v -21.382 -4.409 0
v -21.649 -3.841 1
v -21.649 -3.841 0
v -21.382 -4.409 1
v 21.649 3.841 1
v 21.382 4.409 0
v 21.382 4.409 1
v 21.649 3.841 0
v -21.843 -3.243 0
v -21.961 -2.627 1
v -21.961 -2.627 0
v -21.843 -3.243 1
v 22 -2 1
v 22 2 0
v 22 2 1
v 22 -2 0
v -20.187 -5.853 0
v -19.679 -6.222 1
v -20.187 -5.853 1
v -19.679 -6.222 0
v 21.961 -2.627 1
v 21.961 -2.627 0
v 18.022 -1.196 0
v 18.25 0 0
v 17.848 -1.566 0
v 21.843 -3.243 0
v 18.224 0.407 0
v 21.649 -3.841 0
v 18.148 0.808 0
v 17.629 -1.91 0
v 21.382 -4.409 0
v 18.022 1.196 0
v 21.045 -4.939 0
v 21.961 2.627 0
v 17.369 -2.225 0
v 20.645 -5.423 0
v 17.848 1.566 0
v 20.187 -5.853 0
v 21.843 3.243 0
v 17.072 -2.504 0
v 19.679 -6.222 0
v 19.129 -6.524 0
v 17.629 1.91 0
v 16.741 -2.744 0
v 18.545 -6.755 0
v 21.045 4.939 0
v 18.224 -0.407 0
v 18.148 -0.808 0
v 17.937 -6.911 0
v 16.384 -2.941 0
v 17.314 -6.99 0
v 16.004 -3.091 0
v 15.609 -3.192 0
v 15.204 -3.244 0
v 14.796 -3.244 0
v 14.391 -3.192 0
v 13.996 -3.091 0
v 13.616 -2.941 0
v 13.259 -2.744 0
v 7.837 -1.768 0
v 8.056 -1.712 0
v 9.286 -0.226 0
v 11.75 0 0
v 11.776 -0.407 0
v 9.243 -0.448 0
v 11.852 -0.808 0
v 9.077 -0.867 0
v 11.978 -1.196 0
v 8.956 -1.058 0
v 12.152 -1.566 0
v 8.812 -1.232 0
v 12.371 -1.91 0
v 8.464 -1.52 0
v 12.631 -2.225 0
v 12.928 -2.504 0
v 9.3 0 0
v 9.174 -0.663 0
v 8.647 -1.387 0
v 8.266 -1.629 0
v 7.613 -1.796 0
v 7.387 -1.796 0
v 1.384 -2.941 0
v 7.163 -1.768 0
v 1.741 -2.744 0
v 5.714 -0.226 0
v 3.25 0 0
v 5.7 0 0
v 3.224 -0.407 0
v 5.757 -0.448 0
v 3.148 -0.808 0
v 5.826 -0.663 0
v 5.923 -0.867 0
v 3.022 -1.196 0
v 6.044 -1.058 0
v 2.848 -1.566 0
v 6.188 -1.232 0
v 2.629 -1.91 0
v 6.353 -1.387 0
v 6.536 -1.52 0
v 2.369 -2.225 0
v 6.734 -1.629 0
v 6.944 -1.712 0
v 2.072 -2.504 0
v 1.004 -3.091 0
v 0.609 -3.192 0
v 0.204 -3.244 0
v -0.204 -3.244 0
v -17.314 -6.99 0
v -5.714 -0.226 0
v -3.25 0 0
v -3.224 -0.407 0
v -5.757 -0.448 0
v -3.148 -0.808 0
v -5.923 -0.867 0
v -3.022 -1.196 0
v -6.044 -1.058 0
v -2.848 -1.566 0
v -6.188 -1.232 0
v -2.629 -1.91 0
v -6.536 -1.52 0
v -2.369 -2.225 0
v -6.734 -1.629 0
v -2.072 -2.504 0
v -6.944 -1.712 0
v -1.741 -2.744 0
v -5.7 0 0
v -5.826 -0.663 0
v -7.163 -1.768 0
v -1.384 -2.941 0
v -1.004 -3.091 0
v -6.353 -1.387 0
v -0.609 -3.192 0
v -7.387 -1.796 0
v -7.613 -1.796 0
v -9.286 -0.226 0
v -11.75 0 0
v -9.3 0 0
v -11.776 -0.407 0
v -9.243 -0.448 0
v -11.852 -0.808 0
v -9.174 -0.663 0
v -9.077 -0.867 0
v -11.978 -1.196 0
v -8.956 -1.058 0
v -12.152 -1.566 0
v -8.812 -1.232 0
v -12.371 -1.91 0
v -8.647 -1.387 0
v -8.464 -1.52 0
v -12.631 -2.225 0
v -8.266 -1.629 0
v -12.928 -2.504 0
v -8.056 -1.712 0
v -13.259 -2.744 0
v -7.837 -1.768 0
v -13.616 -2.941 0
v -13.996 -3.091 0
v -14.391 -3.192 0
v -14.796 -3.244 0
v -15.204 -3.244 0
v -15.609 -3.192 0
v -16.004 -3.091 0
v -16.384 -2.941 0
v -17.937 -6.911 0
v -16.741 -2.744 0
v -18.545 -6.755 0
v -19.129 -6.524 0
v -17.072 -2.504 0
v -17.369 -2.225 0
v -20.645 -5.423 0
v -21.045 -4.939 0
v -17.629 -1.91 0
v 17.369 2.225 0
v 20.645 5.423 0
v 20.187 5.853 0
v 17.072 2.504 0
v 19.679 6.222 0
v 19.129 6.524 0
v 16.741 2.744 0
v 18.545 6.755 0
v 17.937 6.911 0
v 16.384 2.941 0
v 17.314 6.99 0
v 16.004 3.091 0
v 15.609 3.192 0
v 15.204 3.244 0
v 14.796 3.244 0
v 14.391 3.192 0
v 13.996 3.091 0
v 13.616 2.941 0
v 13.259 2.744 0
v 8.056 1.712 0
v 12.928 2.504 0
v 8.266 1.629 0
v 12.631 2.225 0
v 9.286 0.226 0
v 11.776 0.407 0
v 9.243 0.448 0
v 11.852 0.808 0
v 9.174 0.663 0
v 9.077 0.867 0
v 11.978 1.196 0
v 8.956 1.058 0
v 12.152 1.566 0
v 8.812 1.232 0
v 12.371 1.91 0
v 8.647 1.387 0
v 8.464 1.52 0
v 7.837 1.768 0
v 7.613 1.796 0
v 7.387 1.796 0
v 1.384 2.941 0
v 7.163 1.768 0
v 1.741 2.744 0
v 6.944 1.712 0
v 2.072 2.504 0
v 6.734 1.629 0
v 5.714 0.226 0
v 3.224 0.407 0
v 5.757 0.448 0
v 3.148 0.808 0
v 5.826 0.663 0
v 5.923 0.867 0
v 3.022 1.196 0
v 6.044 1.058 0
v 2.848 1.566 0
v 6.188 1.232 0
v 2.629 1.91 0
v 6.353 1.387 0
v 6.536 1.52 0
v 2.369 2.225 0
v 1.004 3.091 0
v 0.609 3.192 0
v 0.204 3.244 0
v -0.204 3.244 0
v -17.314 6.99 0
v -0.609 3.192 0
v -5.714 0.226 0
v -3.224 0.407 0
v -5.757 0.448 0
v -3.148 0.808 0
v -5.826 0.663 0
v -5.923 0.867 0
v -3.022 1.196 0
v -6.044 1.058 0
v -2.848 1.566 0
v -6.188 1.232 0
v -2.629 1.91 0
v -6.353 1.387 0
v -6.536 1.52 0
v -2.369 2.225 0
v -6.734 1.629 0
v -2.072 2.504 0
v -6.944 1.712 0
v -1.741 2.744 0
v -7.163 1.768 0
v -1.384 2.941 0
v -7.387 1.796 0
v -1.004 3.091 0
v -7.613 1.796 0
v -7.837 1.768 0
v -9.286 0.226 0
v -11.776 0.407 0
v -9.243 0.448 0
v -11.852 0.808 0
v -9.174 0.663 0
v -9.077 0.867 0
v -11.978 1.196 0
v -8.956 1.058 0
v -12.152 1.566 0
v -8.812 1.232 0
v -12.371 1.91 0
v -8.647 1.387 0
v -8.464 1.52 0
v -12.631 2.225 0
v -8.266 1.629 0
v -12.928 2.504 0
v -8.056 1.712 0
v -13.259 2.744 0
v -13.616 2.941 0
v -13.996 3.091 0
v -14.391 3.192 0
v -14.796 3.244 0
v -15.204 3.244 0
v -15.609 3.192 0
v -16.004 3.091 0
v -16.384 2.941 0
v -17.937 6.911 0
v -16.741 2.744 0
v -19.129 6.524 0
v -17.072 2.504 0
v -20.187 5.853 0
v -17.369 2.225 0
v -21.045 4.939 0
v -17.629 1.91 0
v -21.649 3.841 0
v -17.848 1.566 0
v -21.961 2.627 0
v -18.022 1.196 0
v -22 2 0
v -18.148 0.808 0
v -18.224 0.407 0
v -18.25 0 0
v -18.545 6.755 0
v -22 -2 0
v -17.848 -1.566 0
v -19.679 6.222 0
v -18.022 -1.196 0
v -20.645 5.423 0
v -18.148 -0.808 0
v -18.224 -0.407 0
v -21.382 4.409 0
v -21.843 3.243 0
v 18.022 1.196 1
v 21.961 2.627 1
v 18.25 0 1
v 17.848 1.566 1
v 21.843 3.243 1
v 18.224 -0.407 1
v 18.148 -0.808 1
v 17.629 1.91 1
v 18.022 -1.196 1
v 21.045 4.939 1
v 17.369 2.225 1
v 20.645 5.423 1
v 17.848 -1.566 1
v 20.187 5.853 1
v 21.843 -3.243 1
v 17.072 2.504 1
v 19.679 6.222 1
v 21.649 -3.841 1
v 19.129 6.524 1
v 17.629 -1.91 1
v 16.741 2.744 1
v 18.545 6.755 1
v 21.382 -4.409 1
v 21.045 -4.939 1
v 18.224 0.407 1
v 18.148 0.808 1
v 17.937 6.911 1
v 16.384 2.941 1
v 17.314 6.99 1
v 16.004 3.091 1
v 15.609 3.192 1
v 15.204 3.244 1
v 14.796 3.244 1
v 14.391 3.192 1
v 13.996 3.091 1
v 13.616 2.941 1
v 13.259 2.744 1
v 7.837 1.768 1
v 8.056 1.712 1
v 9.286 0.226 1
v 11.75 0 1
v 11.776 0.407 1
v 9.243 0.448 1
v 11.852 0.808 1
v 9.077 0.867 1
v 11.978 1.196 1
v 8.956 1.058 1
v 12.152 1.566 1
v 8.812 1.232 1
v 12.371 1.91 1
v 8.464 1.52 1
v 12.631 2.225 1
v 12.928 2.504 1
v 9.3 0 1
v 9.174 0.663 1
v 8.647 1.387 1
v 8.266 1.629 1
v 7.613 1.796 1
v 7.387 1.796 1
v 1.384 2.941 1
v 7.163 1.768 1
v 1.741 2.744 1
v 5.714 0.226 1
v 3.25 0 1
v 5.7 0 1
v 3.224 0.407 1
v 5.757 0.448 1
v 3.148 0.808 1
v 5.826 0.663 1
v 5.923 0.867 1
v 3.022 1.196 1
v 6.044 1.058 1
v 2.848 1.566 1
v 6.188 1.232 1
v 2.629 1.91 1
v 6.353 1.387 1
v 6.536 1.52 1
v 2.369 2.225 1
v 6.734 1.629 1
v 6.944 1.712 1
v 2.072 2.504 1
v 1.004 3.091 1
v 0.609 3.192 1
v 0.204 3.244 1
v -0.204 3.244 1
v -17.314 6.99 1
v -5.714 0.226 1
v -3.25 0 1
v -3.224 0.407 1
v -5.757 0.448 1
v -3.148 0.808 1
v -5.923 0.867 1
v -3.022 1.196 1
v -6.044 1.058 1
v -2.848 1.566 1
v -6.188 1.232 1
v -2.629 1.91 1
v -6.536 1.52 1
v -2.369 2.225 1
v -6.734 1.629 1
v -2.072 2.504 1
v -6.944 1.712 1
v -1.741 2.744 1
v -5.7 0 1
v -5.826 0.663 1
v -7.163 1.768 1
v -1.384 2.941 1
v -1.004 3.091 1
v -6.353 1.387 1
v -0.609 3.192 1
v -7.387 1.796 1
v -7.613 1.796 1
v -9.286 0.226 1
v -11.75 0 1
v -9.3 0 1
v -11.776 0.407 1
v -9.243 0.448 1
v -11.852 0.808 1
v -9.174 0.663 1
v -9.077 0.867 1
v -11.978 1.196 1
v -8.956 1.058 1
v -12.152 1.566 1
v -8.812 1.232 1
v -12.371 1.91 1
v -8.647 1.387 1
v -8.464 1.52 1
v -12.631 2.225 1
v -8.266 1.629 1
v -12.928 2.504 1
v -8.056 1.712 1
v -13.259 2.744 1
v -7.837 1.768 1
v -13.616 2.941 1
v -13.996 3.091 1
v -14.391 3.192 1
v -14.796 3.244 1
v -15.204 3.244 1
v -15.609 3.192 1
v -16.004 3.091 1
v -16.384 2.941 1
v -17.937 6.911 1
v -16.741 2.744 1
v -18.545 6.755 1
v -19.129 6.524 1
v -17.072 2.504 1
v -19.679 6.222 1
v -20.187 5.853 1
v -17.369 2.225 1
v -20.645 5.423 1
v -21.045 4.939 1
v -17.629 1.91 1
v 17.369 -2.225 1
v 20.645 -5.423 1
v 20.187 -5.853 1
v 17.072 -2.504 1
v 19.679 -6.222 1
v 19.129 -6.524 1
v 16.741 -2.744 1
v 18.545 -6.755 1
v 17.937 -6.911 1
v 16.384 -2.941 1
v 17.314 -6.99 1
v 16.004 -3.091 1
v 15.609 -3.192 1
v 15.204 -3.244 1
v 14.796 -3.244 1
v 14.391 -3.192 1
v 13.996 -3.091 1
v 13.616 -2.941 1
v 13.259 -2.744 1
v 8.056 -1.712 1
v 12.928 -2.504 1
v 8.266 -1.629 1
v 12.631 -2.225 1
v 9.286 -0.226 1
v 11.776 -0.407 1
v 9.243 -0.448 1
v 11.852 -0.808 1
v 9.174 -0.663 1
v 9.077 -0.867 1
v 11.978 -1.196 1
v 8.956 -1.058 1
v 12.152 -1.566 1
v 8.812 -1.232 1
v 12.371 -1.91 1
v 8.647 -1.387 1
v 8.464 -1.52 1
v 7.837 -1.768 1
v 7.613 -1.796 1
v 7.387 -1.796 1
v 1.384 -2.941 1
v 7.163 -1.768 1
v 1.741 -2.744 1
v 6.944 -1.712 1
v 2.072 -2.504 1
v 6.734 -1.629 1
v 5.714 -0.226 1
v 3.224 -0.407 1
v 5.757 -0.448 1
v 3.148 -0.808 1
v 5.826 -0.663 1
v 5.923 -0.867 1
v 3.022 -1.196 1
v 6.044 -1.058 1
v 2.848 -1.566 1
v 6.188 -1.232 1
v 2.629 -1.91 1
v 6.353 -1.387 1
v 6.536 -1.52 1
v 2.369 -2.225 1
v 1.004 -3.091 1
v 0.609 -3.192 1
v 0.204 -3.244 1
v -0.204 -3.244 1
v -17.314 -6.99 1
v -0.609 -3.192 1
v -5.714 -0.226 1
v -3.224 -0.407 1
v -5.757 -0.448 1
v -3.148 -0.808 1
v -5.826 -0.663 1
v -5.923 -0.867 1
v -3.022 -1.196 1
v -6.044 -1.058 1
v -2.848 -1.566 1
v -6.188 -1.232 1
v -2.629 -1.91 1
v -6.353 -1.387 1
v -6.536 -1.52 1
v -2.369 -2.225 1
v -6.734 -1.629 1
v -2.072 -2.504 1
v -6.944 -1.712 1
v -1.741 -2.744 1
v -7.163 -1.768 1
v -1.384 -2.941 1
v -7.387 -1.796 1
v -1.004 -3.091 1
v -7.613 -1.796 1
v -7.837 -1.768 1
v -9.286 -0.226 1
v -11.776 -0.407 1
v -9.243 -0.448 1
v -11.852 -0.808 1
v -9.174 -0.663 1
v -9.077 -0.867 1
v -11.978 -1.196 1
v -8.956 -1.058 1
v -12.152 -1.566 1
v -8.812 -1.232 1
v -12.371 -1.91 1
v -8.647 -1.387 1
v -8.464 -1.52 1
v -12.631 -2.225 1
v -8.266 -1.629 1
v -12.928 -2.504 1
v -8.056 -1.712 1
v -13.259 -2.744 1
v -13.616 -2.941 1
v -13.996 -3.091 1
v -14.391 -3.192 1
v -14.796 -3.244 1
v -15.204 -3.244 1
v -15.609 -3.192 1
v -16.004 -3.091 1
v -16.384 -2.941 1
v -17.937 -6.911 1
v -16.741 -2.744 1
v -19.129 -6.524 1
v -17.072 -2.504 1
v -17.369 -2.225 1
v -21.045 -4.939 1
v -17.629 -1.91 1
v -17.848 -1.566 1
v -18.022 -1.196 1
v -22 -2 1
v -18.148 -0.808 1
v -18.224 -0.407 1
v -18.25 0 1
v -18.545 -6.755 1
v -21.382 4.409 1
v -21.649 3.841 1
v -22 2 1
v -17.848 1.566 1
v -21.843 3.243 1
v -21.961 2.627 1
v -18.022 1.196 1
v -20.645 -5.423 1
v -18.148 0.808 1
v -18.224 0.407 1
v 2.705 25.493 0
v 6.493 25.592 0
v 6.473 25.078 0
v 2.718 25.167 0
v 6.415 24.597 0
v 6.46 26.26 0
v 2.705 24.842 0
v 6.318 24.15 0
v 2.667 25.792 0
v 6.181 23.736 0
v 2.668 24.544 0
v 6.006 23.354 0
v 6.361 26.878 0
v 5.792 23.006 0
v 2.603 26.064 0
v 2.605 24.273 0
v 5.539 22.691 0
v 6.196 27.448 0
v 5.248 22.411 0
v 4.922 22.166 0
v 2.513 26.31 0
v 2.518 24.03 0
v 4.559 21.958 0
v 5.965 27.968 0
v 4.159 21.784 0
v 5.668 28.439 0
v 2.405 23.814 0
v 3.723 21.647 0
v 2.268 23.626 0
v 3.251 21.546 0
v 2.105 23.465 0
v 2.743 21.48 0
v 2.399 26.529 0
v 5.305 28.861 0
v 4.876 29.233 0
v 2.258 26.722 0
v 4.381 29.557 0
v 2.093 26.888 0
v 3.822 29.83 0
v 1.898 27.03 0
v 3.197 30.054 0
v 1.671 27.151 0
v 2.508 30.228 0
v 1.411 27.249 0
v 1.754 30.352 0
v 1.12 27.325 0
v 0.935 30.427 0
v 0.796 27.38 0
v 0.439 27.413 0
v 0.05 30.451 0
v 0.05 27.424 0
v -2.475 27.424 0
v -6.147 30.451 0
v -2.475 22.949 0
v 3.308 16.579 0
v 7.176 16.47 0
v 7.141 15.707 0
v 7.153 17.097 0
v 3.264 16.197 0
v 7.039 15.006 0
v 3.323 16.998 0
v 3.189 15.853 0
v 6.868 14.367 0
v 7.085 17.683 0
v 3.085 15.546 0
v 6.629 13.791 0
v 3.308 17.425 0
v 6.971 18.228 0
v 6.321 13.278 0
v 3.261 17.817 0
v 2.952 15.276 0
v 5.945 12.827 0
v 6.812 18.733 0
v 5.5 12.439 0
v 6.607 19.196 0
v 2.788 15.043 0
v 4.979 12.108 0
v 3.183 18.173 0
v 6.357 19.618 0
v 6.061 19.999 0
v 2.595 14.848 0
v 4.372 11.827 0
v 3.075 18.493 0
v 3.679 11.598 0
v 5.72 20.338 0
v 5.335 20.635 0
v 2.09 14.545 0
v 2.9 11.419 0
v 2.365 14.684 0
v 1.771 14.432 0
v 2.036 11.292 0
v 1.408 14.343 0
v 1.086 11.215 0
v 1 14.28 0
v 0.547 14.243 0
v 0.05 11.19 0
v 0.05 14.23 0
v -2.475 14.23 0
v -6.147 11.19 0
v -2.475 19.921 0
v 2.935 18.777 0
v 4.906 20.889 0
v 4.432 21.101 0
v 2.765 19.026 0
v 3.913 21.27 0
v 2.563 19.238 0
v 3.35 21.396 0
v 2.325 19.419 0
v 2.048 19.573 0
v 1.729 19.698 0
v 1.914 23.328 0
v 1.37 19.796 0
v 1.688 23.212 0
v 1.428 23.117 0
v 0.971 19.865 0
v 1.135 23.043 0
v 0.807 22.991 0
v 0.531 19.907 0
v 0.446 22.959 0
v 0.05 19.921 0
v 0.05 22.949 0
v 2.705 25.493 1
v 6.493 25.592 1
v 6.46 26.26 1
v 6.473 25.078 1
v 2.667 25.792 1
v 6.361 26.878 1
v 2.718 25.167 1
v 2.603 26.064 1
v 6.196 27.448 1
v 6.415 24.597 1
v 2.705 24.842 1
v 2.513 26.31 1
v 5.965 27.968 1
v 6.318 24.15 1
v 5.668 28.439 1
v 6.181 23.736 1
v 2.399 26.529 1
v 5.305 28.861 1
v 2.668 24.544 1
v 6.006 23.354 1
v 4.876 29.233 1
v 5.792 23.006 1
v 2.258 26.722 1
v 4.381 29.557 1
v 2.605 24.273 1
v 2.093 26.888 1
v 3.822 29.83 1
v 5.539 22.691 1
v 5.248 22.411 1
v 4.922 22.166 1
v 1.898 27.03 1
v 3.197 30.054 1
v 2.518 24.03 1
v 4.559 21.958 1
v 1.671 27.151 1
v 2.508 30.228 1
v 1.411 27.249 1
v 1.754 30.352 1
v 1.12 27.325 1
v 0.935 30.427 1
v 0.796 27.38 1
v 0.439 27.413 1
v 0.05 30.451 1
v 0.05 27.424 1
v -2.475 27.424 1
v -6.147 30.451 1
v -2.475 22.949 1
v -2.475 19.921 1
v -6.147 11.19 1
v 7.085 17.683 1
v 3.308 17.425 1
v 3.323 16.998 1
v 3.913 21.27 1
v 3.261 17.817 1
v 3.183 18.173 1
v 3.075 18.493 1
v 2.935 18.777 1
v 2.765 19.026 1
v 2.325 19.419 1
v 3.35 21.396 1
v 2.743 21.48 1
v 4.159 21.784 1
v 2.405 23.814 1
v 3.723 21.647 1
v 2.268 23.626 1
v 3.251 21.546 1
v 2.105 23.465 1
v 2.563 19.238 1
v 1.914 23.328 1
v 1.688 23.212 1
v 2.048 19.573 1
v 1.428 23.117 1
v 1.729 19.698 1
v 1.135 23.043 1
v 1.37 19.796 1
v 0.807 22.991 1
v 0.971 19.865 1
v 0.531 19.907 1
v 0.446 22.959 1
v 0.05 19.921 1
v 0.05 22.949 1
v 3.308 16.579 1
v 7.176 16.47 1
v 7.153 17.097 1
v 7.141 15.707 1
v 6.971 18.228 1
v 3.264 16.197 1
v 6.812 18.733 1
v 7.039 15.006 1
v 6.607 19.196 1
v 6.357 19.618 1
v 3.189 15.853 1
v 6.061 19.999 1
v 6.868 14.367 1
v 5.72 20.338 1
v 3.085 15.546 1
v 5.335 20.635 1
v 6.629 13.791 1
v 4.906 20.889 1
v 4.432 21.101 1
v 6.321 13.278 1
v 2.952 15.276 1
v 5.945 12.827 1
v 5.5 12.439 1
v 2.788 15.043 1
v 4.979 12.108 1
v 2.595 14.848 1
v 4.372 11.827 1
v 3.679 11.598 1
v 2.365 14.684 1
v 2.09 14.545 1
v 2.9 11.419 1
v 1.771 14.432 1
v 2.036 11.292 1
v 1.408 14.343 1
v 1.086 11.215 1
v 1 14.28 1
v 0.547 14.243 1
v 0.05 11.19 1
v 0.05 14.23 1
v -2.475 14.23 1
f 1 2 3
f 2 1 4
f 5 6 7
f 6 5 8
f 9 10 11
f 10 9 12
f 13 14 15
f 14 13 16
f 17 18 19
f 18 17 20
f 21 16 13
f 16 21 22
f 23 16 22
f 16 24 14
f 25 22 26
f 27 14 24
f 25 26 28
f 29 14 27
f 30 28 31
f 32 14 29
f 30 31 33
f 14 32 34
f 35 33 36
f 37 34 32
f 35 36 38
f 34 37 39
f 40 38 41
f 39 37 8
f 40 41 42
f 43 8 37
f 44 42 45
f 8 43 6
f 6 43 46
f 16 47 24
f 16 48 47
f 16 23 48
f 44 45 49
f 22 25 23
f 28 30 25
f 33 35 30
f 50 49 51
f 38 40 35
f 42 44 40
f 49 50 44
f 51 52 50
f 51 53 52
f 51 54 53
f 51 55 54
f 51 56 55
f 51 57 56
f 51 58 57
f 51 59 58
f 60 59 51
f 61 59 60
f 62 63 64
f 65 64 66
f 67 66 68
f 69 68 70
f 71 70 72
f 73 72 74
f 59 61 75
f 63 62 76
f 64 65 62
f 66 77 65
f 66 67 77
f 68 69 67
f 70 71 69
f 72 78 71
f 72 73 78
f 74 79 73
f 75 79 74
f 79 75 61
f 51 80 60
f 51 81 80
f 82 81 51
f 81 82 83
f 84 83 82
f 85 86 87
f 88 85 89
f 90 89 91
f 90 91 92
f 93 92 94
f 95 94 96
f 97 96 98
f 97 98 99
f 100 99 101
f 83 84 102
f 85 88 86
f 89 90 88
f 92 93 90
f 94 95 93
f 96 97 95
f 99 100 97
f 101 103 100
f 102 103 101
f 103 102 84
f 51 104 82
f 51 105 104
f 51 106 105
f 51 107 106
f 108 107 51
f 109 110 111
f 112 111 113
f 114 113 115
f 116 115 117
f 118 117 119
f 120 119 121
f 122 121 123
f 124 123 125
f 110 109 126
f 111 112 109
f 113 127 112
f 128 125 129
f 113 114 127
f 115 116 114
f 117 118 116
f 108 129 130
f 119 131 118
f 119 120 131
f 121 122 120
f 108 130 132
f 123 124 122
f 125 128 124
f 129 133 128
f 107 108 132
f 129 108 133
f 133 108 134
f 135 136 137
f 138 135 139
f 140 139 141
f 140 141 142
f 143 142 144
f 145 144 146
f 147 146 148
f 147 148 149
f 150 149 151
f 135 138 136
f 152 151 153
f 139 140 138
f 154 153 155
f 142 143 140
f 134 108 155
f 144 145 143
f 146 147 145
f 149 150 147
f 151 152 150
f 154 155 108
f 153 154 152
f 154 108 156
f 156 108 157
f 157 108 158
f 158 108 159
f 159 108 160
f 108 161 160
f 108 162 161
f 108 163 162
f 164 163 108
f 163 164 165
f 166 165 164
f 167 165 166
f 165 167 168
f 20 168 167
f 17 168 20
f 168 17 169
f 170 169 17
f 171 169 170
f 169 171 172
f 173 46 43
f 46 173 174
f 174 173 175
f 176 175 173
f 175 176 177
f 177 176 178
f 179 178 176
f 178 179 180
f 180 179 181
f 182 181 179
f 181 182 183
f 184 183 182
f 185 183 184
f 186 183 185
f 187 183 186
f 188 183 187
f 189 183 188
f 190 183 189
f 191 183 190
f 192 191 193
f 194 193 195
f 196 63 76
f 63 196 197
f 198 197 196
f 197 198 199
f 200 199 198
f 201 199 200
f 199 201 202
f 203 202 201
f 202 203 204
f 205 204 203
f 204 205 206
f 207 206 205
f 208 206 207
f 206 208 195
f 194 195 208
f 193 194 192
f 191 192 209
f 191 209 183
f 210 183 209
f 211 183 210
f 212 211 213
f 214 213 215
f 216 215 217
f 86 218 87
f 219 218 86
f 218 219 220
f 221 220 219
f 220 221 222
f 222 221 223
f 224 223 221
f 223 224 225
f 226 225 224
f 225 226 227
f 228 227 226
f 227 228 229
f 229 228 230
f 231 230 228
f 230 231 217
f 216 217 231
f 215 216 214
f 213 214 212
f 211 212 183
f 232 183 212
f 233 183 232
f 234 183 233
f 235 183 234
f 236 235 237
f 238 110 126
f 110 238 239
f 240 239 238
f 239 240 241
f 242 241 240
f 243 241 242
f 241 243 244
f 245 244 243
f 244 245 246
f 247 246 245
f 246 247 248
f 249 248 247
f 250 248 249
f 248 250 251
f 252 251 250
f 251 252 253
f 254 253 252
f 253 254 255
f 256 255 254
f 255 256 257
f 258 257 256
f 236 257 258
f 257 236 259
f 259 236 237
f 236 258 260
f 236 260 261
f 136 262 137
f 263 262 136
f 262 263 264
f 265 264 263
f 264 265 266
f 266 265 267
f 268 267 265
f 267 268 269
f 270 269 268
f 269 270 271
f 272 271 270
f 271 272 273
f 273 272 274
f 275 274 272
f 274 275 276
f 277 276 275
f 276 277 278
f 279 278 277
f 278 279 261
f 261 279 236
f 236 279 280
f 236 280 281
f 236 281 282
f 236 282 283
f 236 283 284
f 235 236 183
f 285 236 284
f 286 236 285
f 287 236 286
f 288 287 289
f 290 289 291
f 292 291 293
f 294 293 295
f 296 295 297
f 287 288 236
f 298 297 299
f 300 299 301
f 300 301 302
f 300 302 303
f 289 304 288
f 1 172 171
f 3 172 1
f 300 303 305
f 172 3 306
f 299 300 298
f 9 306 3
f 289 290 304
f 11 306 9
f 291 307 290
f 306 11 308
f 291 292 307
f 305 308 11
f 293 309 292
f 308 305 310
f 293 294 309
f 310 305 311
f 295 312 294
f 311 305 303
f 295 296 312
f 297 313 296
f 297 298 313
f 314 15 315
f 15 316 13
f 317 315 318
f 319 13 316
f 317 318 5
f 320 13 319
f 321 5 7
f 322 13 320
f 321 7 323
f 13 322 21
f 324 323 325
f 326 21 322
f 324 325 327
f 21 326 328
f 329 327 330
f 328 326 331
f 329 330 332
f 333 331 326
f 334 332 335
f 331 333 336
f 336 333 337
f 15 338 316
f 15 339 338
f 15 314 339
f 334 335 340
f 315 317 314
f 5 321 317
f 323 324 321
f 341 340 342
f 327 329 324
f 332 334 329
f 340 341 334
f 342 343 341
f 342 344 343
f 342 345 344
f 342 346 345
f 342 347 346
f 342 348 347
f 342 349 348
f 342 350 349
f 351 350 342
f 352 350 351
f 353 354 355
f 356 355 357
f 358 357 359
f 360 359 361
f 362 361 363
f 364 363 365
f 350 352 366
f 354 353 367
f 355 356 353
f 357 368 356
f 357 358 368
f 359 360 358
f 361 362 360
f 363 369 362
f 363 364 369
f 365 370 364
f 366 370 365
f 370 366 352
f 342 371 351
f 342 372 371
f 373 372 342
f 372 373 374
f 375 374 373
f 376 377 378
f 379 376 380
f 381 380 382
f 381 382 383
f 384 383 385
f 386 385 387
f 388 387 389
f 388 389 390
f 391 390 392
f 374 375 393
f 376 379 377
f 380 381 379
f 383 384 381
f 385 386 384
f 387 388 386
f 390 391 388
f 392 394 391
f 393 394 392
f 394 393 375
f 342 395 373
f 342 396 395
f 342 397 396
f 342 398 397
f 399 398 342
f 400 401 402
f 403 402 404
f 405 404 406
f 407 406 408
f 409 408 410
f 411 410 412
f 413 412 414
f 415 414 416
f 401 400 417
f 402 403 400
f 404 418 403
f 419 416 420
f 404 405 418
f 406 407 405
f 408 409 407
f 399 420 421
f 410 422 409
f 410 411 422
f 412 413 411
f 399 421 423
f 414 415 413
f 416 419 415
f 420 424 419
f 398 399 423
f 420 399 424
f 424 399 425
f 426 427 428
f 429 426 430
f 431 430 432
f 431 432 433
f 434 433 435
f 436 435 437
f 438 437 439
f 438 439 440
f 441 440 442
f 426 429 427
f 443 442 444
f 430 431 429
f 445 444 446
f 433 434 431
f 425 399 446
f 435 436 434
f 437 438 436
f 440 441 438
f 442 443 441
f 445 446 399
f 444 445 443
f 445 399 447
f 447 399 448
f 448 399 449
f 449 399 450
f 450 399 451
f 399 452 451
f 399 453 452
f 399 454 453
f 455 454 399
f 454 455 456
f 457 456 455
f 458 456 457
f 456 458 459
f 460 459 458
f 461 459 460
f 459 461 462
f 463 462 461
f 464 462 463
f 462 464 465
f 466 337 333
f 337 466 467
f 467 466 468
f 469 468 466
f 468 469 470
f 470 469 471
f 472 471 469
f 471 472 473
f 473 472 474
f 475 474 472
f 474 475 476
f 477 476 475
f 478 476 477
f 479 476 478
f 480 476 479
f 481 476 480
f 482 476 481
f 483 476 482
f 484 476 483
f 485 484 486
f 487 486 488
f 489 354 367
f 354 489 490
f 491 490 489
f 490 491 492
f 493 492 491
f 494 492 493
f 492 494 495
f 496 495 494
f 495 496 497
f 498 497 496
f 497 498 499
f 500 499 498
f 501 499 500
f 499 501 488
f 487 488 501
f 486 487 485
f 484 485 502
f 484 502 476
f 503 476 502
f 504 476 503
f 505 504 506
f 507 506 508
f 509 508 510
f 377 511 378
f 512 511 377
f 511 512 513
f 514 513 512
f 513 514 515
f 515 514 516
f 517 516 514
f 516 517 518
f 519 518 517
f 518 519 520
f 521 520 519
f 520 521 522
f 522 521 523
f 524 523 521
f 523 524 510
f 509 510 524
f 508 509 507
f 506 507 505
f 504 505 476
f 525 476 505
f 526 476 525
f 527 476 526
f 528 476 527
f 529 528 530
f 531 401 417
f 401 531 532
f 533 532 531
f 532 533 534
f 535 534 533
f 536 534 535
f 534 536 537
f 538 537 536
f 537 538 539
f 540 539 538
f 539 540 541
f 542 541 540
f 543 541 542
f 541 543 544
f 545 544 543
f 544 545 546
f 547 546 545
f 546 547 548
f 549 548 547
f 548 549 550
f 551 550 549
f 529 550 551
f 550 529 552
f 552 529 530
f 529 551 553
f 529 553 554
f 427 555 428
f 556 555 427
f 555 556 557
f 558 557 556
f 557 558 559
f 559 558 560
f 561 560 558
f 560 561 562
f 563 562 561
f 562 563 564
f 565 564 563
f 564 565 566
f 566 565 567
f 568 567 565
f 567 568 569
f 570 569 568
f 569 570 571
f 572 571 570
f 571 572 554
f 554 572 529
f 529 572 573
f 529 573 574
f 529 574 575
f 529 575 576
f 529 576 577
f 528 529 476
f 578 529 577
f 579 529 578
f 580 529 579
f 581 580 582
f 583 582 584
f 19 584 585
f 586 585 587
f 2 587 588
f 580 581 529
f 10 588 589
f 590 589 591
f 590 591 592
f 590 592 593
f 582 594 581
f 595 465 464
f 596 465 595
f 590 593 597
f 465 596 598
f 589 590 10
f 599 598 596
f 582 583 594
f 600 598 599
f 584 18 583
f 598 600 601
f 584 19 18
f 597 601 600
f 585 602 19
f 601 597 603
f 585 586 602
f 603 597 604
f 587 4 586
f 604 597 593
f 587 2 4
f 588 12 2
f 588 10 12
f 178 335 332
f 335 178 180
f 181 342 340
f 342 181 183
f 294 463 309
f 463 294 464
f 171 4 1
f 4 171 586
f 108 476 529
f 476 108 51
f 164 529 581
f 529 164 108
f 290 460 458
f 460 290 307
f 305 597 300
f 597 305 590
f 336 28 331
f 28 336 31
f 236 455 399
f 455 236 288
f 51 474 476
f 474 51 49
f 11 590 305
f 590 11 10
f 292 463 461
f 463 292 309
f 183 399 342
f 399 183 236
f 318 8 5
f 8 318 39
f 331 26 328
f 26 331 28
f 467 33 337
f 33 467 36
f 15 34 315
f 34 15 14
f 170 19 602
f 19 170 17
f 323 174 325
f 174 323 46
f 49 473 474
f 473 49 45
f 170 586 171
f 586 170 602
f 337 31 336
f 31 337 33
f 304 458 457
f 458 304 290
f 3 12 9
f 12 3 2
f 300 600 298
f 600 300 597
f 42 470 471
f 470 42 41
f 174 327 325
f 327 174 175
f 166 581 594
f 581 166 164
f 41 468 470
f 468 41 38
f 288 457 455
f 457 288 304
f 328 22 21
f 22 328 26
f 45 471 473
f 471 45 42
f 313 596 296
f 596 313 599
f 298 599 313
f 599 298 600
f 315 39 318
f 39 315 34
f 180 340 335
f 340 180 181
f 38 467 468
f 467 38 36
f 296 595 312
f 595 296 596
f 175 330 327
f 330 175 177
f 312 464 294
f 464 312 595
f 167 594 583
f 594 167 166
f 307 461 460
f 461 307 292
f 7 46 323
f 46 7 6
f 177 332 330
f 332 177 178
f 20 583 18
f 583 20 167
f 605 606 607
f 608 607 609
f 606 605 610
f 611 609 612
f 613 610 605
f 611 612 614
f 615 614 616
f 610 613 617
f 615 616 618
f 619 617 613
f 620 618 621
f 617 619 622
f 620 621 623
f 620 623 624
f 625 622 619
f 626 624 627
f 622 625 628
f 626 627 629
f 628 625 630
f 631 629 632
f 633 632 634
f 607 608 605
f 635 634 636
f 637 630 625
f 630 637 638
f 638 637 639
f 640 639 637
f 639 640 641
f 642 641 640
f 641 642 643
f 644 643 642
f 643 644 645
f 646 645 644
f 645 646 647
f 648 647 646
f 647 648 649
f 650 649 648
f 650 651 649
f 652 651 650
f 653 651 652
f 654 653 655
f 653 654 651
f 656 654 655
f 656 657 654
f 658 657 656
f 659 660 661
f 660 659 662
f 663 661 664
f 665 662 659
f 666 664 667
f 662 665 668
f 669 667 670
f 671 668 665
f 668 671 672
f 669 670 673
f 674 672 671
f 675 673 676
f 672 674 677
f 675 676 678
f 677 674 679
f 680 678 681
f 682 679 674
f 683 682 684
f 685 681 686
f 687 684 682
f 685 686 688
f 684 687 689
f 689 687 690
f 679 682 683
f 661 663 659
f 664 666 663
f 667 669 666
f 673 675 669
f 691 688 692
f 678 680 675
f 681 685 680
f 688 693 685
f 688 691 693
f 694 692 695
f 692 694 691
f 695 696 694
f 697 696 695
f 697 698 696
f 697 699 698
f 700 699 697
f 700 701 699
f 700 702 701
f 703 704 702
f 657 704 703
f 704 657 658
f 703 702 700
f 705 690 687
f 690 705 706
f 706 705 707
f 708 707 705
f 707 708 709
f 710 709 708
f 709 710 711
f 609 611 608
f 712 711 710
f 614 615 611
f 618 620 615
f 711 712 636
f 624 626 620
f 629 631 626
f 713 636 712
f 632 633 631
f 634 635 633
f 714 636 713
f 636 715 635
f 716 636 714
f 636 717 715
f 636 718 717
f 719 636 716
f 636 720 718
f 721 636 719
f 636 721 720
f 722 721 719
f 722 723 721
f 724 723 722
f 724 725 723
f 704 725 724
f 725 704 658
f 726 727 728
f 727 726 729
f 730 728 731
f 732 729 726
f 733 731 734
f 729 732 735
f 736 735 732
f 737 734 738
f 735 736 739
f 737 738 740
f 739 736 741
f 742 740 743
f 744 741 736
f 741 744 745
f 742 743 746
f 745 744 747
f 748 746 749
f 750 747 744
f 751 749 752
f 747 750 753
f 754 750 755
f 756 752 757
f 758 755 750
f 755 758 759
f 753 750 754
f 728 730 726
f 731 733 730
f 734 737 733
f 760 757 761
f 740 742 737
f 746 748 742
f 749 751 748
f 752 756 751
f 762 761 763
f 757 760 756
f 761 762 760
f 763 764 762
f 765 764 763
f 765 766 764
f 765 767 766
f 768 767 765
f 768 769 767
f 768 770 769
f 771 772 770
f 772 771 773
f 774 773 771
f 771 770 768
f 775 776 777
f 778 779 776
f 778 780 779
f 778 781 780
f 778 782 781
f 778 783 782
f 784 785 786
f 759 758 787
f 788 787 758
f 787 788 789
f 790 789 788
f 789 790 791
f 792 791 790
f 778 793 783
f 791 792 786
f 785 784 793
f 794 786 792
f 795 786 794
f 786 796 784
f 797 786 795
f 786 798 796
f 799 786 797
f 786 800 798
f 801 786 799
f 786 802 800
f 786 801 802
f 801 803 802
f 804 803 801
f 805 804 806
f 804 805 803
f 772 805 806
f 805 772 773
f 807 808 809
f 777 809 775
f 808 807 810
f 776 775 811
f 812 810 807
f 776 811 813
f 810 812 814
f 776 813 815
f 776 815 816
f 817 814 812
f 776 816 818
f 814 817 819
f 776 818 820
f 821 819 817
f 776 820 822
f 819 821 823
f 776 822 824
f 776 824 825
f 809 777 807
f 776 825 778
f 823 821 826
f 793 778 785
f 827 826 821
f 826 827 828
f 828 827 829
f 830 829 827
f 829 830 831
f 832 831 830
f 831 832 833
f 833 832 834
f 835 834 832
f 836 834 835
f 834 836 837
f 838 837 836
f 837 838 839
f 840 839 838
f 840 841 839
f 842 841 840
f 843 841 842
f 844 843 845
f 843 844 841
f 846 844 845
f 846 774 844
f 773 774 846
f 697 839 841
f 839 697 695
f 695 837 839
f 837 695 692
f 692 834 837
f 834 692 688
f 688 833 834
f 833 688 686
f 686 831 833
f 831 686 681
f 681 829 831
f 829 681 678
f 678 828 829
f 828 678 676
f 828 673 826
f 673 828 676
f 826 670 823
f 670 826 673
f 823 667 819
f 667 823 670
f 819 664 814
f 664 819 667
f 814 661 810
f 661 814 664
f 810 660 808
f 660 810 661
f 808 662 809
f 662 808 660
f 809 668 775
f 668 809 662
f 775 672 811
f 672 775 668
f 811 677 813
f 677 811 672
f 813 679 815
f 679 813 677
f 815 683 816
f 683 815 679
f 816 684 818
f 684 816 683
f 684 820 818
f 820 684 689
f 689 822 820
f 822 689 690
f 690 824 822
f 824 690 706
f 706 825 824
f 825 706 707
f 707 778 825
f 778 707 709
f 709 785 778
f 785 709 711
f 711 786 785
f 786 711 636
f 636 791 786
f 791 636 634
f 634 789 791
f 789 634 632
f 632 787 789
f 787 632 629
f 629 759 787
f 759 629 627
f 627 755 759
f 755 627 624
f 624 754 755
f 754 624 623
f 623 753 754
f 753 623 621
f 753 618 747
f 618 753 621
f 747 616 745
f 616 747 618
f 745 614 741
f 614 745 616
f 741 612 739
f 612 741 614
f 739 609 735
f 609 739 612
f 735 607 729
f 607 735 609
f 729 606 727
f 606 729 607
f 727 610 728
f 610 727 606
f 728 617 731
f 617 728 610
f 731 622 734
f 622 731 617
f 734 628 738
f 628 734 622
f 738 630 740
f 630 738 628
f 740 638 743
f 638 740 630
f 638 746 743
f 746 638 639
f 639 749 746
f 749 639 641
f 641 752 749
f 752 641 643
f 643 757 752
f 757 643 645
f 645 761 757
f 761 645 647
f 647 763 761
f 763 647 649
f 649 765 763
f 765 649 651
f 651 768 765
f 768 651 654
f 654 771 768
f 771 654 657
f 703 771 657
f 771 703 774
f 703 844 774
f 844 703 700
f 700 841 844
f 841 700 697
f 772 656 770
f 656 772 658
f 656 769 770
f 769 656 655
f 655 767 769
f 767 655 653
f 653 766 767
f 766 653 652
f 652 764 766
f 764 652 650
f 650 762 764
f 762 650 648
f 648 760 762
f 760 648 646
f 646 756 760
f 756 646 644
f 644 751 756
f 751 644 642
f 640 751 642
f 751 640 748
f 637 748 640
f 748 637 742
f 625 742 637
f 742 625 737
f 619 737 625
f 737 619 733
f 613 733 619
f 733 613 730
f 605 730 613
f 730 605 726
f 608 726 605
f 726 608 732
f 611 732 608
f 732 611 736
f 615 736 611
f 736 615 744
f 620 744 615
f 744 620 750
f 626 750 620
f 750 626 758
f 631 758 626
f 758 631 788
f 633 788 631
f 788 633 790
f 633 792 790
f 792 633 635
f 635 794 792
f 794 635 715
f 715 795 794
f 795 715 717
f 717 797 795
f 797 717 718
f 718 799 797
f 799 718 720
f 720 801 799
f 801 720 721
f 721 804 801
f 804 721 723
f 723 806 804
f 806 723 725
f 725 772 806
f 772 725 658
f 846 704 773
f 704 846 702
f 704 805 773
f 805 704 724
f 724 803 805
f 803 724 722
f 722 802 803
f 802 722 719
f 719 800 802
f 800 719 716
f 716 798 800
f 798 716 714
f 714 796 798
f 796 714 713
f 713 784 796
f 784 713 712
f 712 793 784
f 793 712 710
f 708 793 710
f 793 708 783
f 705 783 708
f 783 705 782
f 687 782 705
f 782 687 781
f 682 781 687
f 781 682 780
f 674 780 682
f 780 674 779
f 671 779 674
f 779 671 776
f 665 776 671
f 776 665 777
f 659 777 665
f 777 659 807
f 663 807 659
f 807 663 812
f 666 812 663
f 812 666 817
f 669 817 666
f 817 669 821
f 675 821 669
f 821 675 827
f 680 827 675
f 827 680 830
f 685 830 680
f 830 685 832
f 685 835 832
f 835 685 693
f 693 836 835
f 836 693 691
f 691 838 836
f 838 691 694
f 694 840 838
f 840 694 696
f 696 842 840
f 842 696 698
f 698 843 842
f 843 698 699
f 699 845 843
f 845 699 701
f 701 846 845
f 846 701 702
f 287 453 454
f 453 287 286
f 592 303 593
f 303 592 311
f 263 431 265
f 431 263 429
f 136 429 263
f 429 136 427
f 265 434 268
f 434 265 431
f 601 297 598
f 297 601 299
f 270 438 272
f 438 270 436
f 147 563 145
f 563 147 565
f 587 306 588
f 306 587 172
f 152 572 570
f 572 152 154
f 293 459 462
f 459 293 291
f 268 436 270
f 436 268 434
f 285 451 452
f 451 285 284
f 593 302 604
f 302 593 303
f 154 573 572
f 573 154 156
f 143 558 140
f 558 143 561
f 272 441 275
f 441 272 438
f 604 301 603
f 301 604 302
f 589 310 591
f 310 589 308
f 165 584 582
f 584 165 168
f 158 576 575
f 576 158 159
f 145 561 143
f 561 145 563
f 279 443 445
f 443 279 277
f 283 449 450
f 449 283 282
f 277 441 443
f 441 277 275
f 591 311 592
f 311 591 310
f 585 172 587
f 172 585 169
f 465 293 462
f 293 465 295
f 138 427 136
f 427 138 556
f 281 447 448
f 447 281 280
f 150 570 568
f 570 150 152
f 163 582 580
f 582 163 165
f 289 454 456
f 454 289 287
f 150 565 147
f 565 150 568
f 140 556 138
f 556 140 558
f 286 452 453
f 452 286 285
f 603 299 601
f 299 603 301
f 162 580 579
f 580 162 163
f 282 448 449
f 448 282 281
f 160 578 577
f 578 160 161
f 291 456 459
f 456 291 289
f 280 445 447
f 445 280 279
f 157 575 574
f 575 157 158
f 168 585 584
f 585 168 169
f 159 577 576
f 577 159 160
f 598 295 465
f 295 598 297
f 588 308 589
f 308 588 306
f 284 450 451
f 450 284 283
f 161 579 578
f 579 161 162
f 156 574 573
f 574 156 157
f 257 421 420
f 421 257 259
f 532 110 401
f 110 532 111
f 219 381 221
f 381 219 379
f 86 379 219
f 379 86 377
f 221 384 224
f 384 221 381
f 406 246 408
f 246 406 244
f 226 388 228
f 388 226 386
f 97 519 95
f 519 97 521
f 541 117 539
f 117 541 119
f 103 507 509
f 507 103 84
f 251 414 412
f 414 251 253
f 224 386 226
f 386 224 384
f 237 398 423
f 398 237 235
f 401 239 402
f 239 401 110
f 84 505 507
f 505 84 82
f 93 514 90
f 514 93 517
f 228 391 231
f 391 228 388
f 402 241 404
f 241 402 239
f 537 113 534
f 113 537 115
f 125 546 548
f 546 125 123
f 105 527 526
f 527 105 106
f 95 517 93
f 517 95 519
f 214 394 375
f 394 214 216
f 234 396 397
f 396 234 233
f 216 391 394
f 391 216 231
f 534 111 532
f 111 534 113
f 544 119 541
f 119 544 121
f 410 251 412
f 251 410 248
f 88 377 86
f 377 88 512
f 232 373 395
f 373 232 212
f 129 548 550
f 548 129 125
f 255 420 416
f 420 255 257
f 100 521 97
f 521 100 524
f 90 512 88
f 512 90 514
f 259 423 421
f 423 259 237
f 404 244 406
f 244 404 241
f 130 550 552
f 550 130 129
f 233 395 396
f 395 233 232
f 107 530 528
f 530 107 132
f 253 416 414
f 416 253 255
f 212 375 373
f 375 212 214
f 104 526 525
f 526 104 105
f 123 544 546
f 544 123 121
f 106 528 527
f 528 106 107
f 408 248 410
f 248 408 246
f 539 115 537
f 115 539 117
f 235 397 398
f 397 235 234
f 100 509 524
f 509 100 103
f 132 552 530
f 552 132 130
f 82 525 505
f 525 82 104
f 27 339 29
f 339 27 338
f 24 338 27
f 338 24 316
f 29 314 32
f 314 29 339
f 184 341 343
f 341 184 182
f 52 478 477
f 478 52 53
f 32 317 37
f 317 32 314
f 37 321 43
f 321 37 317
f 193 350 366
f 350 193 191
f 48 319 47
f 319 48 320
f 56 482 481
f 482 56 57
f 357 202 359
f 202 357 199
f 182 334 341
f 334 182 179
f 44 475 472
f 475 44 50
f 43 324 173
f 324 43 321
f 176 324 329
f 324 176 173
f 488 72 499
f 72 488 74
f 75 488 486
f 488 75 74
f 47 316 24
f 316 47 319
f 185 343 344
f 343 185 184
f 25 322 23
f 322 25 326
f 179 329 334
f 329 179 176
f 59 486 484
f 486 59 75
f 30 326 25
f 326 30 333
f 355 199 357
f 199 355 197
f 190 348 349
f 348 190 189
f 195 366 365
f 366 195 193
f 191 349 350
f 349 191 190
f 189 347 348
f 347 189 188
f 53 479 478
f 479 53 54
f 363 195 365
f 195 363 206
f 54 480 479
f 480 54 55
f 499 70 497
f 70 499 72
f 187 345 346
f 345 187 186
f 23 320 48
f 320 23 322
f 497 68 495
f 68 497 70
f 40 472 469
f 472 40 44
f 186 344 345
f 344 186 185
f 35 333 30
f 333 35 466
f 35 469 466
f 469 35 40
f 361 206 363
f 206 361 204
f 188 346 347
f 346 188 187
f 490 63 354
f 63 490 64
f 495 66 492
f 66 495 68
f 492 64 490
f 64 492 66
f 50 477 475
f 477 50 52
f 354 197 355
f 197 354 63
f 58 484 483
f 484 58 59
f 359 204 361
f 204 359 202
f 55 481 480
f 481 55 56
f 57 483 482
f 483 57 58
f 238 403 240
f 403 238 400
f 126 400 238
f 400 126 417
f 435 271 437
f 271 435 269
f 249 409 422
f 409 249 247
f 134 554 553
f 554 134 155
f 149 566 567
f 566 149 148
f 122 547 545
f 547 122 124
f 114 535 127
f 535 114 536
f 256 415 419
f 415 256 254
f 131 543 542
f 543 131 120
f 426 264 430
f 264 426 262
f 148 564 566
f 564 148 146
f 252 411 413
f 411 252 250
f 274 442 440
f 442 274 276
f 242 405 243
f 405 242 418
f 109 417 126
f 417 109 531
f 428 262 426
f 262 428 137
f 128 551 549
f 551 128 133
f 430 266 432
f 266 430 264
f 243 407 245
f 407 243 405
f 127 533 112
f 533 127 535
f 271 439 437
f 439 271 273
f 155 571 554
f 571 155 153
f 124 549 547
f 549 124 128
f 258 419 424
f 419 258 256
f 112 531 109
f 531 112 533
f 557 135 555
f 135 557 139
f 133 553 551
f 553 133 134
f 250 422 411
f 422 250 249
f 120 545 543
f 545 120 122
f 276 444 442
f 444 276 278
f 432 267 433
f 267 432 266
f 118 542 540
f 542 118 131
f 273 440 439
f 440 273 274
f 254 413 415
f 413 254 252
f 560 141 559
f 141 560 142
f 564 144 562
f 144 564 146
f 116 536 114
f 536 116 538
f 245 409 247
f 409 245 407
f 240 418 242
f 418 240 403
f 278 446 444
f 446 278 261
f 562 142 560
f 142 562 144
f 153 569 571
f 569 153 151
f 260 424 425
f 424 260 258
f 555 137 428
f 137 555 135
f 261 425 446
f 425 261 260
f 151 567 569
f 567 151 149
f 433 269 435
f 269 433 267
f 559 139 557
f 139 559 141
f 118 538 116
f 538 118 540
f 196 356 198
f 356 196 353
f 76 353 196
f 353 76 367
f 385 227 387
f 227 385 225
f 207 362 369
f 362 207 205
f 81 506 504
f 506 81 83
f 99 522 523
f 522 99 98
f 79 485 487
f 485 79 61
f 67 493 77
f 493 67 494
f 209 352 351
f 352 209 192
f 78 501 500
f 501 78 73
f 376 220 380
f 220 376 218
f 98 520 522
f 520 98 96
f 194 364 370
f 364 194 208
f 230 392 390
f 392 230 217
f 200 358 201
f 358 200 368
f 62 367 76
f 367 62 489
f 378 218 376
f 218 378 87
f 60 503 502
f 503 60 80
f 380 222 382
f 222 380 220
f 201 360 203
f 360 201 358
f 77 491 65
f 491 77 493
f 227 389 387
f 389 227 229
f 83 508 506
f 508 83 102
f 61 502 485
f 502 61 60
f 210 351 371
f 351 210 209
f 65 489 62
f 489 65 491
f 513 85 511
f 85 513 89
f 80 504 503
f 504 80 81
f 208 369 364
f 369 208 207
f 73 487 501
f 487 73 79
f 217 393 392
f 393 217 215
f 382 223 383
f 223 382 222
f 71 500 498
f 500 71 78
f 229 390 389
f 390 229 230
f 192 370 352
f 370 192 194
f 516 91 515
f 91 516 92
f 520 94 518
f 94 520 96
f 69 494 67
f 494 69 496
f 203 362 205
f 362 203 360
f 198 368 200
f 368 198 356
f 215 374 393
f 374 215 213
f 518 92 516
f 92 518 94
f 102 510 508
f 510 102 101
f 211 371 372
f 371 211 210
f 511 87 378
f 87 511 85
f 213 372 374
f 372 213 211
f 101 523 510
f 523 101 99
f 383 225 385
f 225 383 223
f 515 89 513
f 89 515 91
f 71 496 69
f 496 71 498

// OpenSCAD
$fn = 50;


difference() {
	union() {
		hull() {
			translate(v = [-17.0000000000, 2.0000000000, 0]) {
				cylinder(h = 1, r = 5);
			}
			translate(v = [17.0000000000, 2.0000000000, 0]) {
				cylinder(h = 1, r = 5);
			}
			translate(v = [-17.0000000000, -2.0000000000, 0]) {
				cylinder(h = 1, r = 5);
			}
			translate(v = [17.0000000000, -2.0000000000, 0]) {
				cylinder(h = 1, r = 5);
			}
		}
		translate(v = [0, 30.0000000000, 0]) {
			linear_extrude(height = 1) {
				text(font = "DejaVu Sans Mono:style=Bold", halign = "center", size = 19.0000000000, text = "B", valign = "top");
			}
		}
	}
	union() {
		translate(v = [-15.0000000000, 0.0000000000, 0]) {
			translate(v = [0, 0, -100]) {
				cylinder(h = 200, r = 3.2500000000);
			}
		}
		translate(v = [0, 0, -100]) {
			cylinder(h = 200, r = 3.2500000000);
		}
		translate(v = [15.0000000000, 0.0000000000, 0]) {
			translate(v = [0, 0, -100]) {
				cylinder(h = 200, r = 3.2500000000);
			}
		}
		translate(v = [-15.0000000000, 0.0000000000, 0]) {
			translate(v = [0, 0, -100]) {
				cylinder(h = 200, r = 1.8000000000);
			}
		}
		translate(v = [-7.5000000000, 0.0000000000, 0]) {
			translate(v = [0, 0, -100]) {
				cylinder(h = 200, r = 1.8000000000);
			}
		}
		translate(v = [0, 0, -100]) {
			cylinder(h = 200, r = 1.8000000000);
		}
		translate(v = [7.5000000000, 0.0000000000, 0]) {
			translate(v = [0, 0, -100]) {
				cylinder(h = 200, r = 1.8000000000);
			}
		}
		translate(v = [15.0000000000, 0.0000000000, 0]) {
			translate(v = [0, 0, -100]) {
				cylinder(h = 200, r = 1.8000000000);
			}
		}
	}
}
